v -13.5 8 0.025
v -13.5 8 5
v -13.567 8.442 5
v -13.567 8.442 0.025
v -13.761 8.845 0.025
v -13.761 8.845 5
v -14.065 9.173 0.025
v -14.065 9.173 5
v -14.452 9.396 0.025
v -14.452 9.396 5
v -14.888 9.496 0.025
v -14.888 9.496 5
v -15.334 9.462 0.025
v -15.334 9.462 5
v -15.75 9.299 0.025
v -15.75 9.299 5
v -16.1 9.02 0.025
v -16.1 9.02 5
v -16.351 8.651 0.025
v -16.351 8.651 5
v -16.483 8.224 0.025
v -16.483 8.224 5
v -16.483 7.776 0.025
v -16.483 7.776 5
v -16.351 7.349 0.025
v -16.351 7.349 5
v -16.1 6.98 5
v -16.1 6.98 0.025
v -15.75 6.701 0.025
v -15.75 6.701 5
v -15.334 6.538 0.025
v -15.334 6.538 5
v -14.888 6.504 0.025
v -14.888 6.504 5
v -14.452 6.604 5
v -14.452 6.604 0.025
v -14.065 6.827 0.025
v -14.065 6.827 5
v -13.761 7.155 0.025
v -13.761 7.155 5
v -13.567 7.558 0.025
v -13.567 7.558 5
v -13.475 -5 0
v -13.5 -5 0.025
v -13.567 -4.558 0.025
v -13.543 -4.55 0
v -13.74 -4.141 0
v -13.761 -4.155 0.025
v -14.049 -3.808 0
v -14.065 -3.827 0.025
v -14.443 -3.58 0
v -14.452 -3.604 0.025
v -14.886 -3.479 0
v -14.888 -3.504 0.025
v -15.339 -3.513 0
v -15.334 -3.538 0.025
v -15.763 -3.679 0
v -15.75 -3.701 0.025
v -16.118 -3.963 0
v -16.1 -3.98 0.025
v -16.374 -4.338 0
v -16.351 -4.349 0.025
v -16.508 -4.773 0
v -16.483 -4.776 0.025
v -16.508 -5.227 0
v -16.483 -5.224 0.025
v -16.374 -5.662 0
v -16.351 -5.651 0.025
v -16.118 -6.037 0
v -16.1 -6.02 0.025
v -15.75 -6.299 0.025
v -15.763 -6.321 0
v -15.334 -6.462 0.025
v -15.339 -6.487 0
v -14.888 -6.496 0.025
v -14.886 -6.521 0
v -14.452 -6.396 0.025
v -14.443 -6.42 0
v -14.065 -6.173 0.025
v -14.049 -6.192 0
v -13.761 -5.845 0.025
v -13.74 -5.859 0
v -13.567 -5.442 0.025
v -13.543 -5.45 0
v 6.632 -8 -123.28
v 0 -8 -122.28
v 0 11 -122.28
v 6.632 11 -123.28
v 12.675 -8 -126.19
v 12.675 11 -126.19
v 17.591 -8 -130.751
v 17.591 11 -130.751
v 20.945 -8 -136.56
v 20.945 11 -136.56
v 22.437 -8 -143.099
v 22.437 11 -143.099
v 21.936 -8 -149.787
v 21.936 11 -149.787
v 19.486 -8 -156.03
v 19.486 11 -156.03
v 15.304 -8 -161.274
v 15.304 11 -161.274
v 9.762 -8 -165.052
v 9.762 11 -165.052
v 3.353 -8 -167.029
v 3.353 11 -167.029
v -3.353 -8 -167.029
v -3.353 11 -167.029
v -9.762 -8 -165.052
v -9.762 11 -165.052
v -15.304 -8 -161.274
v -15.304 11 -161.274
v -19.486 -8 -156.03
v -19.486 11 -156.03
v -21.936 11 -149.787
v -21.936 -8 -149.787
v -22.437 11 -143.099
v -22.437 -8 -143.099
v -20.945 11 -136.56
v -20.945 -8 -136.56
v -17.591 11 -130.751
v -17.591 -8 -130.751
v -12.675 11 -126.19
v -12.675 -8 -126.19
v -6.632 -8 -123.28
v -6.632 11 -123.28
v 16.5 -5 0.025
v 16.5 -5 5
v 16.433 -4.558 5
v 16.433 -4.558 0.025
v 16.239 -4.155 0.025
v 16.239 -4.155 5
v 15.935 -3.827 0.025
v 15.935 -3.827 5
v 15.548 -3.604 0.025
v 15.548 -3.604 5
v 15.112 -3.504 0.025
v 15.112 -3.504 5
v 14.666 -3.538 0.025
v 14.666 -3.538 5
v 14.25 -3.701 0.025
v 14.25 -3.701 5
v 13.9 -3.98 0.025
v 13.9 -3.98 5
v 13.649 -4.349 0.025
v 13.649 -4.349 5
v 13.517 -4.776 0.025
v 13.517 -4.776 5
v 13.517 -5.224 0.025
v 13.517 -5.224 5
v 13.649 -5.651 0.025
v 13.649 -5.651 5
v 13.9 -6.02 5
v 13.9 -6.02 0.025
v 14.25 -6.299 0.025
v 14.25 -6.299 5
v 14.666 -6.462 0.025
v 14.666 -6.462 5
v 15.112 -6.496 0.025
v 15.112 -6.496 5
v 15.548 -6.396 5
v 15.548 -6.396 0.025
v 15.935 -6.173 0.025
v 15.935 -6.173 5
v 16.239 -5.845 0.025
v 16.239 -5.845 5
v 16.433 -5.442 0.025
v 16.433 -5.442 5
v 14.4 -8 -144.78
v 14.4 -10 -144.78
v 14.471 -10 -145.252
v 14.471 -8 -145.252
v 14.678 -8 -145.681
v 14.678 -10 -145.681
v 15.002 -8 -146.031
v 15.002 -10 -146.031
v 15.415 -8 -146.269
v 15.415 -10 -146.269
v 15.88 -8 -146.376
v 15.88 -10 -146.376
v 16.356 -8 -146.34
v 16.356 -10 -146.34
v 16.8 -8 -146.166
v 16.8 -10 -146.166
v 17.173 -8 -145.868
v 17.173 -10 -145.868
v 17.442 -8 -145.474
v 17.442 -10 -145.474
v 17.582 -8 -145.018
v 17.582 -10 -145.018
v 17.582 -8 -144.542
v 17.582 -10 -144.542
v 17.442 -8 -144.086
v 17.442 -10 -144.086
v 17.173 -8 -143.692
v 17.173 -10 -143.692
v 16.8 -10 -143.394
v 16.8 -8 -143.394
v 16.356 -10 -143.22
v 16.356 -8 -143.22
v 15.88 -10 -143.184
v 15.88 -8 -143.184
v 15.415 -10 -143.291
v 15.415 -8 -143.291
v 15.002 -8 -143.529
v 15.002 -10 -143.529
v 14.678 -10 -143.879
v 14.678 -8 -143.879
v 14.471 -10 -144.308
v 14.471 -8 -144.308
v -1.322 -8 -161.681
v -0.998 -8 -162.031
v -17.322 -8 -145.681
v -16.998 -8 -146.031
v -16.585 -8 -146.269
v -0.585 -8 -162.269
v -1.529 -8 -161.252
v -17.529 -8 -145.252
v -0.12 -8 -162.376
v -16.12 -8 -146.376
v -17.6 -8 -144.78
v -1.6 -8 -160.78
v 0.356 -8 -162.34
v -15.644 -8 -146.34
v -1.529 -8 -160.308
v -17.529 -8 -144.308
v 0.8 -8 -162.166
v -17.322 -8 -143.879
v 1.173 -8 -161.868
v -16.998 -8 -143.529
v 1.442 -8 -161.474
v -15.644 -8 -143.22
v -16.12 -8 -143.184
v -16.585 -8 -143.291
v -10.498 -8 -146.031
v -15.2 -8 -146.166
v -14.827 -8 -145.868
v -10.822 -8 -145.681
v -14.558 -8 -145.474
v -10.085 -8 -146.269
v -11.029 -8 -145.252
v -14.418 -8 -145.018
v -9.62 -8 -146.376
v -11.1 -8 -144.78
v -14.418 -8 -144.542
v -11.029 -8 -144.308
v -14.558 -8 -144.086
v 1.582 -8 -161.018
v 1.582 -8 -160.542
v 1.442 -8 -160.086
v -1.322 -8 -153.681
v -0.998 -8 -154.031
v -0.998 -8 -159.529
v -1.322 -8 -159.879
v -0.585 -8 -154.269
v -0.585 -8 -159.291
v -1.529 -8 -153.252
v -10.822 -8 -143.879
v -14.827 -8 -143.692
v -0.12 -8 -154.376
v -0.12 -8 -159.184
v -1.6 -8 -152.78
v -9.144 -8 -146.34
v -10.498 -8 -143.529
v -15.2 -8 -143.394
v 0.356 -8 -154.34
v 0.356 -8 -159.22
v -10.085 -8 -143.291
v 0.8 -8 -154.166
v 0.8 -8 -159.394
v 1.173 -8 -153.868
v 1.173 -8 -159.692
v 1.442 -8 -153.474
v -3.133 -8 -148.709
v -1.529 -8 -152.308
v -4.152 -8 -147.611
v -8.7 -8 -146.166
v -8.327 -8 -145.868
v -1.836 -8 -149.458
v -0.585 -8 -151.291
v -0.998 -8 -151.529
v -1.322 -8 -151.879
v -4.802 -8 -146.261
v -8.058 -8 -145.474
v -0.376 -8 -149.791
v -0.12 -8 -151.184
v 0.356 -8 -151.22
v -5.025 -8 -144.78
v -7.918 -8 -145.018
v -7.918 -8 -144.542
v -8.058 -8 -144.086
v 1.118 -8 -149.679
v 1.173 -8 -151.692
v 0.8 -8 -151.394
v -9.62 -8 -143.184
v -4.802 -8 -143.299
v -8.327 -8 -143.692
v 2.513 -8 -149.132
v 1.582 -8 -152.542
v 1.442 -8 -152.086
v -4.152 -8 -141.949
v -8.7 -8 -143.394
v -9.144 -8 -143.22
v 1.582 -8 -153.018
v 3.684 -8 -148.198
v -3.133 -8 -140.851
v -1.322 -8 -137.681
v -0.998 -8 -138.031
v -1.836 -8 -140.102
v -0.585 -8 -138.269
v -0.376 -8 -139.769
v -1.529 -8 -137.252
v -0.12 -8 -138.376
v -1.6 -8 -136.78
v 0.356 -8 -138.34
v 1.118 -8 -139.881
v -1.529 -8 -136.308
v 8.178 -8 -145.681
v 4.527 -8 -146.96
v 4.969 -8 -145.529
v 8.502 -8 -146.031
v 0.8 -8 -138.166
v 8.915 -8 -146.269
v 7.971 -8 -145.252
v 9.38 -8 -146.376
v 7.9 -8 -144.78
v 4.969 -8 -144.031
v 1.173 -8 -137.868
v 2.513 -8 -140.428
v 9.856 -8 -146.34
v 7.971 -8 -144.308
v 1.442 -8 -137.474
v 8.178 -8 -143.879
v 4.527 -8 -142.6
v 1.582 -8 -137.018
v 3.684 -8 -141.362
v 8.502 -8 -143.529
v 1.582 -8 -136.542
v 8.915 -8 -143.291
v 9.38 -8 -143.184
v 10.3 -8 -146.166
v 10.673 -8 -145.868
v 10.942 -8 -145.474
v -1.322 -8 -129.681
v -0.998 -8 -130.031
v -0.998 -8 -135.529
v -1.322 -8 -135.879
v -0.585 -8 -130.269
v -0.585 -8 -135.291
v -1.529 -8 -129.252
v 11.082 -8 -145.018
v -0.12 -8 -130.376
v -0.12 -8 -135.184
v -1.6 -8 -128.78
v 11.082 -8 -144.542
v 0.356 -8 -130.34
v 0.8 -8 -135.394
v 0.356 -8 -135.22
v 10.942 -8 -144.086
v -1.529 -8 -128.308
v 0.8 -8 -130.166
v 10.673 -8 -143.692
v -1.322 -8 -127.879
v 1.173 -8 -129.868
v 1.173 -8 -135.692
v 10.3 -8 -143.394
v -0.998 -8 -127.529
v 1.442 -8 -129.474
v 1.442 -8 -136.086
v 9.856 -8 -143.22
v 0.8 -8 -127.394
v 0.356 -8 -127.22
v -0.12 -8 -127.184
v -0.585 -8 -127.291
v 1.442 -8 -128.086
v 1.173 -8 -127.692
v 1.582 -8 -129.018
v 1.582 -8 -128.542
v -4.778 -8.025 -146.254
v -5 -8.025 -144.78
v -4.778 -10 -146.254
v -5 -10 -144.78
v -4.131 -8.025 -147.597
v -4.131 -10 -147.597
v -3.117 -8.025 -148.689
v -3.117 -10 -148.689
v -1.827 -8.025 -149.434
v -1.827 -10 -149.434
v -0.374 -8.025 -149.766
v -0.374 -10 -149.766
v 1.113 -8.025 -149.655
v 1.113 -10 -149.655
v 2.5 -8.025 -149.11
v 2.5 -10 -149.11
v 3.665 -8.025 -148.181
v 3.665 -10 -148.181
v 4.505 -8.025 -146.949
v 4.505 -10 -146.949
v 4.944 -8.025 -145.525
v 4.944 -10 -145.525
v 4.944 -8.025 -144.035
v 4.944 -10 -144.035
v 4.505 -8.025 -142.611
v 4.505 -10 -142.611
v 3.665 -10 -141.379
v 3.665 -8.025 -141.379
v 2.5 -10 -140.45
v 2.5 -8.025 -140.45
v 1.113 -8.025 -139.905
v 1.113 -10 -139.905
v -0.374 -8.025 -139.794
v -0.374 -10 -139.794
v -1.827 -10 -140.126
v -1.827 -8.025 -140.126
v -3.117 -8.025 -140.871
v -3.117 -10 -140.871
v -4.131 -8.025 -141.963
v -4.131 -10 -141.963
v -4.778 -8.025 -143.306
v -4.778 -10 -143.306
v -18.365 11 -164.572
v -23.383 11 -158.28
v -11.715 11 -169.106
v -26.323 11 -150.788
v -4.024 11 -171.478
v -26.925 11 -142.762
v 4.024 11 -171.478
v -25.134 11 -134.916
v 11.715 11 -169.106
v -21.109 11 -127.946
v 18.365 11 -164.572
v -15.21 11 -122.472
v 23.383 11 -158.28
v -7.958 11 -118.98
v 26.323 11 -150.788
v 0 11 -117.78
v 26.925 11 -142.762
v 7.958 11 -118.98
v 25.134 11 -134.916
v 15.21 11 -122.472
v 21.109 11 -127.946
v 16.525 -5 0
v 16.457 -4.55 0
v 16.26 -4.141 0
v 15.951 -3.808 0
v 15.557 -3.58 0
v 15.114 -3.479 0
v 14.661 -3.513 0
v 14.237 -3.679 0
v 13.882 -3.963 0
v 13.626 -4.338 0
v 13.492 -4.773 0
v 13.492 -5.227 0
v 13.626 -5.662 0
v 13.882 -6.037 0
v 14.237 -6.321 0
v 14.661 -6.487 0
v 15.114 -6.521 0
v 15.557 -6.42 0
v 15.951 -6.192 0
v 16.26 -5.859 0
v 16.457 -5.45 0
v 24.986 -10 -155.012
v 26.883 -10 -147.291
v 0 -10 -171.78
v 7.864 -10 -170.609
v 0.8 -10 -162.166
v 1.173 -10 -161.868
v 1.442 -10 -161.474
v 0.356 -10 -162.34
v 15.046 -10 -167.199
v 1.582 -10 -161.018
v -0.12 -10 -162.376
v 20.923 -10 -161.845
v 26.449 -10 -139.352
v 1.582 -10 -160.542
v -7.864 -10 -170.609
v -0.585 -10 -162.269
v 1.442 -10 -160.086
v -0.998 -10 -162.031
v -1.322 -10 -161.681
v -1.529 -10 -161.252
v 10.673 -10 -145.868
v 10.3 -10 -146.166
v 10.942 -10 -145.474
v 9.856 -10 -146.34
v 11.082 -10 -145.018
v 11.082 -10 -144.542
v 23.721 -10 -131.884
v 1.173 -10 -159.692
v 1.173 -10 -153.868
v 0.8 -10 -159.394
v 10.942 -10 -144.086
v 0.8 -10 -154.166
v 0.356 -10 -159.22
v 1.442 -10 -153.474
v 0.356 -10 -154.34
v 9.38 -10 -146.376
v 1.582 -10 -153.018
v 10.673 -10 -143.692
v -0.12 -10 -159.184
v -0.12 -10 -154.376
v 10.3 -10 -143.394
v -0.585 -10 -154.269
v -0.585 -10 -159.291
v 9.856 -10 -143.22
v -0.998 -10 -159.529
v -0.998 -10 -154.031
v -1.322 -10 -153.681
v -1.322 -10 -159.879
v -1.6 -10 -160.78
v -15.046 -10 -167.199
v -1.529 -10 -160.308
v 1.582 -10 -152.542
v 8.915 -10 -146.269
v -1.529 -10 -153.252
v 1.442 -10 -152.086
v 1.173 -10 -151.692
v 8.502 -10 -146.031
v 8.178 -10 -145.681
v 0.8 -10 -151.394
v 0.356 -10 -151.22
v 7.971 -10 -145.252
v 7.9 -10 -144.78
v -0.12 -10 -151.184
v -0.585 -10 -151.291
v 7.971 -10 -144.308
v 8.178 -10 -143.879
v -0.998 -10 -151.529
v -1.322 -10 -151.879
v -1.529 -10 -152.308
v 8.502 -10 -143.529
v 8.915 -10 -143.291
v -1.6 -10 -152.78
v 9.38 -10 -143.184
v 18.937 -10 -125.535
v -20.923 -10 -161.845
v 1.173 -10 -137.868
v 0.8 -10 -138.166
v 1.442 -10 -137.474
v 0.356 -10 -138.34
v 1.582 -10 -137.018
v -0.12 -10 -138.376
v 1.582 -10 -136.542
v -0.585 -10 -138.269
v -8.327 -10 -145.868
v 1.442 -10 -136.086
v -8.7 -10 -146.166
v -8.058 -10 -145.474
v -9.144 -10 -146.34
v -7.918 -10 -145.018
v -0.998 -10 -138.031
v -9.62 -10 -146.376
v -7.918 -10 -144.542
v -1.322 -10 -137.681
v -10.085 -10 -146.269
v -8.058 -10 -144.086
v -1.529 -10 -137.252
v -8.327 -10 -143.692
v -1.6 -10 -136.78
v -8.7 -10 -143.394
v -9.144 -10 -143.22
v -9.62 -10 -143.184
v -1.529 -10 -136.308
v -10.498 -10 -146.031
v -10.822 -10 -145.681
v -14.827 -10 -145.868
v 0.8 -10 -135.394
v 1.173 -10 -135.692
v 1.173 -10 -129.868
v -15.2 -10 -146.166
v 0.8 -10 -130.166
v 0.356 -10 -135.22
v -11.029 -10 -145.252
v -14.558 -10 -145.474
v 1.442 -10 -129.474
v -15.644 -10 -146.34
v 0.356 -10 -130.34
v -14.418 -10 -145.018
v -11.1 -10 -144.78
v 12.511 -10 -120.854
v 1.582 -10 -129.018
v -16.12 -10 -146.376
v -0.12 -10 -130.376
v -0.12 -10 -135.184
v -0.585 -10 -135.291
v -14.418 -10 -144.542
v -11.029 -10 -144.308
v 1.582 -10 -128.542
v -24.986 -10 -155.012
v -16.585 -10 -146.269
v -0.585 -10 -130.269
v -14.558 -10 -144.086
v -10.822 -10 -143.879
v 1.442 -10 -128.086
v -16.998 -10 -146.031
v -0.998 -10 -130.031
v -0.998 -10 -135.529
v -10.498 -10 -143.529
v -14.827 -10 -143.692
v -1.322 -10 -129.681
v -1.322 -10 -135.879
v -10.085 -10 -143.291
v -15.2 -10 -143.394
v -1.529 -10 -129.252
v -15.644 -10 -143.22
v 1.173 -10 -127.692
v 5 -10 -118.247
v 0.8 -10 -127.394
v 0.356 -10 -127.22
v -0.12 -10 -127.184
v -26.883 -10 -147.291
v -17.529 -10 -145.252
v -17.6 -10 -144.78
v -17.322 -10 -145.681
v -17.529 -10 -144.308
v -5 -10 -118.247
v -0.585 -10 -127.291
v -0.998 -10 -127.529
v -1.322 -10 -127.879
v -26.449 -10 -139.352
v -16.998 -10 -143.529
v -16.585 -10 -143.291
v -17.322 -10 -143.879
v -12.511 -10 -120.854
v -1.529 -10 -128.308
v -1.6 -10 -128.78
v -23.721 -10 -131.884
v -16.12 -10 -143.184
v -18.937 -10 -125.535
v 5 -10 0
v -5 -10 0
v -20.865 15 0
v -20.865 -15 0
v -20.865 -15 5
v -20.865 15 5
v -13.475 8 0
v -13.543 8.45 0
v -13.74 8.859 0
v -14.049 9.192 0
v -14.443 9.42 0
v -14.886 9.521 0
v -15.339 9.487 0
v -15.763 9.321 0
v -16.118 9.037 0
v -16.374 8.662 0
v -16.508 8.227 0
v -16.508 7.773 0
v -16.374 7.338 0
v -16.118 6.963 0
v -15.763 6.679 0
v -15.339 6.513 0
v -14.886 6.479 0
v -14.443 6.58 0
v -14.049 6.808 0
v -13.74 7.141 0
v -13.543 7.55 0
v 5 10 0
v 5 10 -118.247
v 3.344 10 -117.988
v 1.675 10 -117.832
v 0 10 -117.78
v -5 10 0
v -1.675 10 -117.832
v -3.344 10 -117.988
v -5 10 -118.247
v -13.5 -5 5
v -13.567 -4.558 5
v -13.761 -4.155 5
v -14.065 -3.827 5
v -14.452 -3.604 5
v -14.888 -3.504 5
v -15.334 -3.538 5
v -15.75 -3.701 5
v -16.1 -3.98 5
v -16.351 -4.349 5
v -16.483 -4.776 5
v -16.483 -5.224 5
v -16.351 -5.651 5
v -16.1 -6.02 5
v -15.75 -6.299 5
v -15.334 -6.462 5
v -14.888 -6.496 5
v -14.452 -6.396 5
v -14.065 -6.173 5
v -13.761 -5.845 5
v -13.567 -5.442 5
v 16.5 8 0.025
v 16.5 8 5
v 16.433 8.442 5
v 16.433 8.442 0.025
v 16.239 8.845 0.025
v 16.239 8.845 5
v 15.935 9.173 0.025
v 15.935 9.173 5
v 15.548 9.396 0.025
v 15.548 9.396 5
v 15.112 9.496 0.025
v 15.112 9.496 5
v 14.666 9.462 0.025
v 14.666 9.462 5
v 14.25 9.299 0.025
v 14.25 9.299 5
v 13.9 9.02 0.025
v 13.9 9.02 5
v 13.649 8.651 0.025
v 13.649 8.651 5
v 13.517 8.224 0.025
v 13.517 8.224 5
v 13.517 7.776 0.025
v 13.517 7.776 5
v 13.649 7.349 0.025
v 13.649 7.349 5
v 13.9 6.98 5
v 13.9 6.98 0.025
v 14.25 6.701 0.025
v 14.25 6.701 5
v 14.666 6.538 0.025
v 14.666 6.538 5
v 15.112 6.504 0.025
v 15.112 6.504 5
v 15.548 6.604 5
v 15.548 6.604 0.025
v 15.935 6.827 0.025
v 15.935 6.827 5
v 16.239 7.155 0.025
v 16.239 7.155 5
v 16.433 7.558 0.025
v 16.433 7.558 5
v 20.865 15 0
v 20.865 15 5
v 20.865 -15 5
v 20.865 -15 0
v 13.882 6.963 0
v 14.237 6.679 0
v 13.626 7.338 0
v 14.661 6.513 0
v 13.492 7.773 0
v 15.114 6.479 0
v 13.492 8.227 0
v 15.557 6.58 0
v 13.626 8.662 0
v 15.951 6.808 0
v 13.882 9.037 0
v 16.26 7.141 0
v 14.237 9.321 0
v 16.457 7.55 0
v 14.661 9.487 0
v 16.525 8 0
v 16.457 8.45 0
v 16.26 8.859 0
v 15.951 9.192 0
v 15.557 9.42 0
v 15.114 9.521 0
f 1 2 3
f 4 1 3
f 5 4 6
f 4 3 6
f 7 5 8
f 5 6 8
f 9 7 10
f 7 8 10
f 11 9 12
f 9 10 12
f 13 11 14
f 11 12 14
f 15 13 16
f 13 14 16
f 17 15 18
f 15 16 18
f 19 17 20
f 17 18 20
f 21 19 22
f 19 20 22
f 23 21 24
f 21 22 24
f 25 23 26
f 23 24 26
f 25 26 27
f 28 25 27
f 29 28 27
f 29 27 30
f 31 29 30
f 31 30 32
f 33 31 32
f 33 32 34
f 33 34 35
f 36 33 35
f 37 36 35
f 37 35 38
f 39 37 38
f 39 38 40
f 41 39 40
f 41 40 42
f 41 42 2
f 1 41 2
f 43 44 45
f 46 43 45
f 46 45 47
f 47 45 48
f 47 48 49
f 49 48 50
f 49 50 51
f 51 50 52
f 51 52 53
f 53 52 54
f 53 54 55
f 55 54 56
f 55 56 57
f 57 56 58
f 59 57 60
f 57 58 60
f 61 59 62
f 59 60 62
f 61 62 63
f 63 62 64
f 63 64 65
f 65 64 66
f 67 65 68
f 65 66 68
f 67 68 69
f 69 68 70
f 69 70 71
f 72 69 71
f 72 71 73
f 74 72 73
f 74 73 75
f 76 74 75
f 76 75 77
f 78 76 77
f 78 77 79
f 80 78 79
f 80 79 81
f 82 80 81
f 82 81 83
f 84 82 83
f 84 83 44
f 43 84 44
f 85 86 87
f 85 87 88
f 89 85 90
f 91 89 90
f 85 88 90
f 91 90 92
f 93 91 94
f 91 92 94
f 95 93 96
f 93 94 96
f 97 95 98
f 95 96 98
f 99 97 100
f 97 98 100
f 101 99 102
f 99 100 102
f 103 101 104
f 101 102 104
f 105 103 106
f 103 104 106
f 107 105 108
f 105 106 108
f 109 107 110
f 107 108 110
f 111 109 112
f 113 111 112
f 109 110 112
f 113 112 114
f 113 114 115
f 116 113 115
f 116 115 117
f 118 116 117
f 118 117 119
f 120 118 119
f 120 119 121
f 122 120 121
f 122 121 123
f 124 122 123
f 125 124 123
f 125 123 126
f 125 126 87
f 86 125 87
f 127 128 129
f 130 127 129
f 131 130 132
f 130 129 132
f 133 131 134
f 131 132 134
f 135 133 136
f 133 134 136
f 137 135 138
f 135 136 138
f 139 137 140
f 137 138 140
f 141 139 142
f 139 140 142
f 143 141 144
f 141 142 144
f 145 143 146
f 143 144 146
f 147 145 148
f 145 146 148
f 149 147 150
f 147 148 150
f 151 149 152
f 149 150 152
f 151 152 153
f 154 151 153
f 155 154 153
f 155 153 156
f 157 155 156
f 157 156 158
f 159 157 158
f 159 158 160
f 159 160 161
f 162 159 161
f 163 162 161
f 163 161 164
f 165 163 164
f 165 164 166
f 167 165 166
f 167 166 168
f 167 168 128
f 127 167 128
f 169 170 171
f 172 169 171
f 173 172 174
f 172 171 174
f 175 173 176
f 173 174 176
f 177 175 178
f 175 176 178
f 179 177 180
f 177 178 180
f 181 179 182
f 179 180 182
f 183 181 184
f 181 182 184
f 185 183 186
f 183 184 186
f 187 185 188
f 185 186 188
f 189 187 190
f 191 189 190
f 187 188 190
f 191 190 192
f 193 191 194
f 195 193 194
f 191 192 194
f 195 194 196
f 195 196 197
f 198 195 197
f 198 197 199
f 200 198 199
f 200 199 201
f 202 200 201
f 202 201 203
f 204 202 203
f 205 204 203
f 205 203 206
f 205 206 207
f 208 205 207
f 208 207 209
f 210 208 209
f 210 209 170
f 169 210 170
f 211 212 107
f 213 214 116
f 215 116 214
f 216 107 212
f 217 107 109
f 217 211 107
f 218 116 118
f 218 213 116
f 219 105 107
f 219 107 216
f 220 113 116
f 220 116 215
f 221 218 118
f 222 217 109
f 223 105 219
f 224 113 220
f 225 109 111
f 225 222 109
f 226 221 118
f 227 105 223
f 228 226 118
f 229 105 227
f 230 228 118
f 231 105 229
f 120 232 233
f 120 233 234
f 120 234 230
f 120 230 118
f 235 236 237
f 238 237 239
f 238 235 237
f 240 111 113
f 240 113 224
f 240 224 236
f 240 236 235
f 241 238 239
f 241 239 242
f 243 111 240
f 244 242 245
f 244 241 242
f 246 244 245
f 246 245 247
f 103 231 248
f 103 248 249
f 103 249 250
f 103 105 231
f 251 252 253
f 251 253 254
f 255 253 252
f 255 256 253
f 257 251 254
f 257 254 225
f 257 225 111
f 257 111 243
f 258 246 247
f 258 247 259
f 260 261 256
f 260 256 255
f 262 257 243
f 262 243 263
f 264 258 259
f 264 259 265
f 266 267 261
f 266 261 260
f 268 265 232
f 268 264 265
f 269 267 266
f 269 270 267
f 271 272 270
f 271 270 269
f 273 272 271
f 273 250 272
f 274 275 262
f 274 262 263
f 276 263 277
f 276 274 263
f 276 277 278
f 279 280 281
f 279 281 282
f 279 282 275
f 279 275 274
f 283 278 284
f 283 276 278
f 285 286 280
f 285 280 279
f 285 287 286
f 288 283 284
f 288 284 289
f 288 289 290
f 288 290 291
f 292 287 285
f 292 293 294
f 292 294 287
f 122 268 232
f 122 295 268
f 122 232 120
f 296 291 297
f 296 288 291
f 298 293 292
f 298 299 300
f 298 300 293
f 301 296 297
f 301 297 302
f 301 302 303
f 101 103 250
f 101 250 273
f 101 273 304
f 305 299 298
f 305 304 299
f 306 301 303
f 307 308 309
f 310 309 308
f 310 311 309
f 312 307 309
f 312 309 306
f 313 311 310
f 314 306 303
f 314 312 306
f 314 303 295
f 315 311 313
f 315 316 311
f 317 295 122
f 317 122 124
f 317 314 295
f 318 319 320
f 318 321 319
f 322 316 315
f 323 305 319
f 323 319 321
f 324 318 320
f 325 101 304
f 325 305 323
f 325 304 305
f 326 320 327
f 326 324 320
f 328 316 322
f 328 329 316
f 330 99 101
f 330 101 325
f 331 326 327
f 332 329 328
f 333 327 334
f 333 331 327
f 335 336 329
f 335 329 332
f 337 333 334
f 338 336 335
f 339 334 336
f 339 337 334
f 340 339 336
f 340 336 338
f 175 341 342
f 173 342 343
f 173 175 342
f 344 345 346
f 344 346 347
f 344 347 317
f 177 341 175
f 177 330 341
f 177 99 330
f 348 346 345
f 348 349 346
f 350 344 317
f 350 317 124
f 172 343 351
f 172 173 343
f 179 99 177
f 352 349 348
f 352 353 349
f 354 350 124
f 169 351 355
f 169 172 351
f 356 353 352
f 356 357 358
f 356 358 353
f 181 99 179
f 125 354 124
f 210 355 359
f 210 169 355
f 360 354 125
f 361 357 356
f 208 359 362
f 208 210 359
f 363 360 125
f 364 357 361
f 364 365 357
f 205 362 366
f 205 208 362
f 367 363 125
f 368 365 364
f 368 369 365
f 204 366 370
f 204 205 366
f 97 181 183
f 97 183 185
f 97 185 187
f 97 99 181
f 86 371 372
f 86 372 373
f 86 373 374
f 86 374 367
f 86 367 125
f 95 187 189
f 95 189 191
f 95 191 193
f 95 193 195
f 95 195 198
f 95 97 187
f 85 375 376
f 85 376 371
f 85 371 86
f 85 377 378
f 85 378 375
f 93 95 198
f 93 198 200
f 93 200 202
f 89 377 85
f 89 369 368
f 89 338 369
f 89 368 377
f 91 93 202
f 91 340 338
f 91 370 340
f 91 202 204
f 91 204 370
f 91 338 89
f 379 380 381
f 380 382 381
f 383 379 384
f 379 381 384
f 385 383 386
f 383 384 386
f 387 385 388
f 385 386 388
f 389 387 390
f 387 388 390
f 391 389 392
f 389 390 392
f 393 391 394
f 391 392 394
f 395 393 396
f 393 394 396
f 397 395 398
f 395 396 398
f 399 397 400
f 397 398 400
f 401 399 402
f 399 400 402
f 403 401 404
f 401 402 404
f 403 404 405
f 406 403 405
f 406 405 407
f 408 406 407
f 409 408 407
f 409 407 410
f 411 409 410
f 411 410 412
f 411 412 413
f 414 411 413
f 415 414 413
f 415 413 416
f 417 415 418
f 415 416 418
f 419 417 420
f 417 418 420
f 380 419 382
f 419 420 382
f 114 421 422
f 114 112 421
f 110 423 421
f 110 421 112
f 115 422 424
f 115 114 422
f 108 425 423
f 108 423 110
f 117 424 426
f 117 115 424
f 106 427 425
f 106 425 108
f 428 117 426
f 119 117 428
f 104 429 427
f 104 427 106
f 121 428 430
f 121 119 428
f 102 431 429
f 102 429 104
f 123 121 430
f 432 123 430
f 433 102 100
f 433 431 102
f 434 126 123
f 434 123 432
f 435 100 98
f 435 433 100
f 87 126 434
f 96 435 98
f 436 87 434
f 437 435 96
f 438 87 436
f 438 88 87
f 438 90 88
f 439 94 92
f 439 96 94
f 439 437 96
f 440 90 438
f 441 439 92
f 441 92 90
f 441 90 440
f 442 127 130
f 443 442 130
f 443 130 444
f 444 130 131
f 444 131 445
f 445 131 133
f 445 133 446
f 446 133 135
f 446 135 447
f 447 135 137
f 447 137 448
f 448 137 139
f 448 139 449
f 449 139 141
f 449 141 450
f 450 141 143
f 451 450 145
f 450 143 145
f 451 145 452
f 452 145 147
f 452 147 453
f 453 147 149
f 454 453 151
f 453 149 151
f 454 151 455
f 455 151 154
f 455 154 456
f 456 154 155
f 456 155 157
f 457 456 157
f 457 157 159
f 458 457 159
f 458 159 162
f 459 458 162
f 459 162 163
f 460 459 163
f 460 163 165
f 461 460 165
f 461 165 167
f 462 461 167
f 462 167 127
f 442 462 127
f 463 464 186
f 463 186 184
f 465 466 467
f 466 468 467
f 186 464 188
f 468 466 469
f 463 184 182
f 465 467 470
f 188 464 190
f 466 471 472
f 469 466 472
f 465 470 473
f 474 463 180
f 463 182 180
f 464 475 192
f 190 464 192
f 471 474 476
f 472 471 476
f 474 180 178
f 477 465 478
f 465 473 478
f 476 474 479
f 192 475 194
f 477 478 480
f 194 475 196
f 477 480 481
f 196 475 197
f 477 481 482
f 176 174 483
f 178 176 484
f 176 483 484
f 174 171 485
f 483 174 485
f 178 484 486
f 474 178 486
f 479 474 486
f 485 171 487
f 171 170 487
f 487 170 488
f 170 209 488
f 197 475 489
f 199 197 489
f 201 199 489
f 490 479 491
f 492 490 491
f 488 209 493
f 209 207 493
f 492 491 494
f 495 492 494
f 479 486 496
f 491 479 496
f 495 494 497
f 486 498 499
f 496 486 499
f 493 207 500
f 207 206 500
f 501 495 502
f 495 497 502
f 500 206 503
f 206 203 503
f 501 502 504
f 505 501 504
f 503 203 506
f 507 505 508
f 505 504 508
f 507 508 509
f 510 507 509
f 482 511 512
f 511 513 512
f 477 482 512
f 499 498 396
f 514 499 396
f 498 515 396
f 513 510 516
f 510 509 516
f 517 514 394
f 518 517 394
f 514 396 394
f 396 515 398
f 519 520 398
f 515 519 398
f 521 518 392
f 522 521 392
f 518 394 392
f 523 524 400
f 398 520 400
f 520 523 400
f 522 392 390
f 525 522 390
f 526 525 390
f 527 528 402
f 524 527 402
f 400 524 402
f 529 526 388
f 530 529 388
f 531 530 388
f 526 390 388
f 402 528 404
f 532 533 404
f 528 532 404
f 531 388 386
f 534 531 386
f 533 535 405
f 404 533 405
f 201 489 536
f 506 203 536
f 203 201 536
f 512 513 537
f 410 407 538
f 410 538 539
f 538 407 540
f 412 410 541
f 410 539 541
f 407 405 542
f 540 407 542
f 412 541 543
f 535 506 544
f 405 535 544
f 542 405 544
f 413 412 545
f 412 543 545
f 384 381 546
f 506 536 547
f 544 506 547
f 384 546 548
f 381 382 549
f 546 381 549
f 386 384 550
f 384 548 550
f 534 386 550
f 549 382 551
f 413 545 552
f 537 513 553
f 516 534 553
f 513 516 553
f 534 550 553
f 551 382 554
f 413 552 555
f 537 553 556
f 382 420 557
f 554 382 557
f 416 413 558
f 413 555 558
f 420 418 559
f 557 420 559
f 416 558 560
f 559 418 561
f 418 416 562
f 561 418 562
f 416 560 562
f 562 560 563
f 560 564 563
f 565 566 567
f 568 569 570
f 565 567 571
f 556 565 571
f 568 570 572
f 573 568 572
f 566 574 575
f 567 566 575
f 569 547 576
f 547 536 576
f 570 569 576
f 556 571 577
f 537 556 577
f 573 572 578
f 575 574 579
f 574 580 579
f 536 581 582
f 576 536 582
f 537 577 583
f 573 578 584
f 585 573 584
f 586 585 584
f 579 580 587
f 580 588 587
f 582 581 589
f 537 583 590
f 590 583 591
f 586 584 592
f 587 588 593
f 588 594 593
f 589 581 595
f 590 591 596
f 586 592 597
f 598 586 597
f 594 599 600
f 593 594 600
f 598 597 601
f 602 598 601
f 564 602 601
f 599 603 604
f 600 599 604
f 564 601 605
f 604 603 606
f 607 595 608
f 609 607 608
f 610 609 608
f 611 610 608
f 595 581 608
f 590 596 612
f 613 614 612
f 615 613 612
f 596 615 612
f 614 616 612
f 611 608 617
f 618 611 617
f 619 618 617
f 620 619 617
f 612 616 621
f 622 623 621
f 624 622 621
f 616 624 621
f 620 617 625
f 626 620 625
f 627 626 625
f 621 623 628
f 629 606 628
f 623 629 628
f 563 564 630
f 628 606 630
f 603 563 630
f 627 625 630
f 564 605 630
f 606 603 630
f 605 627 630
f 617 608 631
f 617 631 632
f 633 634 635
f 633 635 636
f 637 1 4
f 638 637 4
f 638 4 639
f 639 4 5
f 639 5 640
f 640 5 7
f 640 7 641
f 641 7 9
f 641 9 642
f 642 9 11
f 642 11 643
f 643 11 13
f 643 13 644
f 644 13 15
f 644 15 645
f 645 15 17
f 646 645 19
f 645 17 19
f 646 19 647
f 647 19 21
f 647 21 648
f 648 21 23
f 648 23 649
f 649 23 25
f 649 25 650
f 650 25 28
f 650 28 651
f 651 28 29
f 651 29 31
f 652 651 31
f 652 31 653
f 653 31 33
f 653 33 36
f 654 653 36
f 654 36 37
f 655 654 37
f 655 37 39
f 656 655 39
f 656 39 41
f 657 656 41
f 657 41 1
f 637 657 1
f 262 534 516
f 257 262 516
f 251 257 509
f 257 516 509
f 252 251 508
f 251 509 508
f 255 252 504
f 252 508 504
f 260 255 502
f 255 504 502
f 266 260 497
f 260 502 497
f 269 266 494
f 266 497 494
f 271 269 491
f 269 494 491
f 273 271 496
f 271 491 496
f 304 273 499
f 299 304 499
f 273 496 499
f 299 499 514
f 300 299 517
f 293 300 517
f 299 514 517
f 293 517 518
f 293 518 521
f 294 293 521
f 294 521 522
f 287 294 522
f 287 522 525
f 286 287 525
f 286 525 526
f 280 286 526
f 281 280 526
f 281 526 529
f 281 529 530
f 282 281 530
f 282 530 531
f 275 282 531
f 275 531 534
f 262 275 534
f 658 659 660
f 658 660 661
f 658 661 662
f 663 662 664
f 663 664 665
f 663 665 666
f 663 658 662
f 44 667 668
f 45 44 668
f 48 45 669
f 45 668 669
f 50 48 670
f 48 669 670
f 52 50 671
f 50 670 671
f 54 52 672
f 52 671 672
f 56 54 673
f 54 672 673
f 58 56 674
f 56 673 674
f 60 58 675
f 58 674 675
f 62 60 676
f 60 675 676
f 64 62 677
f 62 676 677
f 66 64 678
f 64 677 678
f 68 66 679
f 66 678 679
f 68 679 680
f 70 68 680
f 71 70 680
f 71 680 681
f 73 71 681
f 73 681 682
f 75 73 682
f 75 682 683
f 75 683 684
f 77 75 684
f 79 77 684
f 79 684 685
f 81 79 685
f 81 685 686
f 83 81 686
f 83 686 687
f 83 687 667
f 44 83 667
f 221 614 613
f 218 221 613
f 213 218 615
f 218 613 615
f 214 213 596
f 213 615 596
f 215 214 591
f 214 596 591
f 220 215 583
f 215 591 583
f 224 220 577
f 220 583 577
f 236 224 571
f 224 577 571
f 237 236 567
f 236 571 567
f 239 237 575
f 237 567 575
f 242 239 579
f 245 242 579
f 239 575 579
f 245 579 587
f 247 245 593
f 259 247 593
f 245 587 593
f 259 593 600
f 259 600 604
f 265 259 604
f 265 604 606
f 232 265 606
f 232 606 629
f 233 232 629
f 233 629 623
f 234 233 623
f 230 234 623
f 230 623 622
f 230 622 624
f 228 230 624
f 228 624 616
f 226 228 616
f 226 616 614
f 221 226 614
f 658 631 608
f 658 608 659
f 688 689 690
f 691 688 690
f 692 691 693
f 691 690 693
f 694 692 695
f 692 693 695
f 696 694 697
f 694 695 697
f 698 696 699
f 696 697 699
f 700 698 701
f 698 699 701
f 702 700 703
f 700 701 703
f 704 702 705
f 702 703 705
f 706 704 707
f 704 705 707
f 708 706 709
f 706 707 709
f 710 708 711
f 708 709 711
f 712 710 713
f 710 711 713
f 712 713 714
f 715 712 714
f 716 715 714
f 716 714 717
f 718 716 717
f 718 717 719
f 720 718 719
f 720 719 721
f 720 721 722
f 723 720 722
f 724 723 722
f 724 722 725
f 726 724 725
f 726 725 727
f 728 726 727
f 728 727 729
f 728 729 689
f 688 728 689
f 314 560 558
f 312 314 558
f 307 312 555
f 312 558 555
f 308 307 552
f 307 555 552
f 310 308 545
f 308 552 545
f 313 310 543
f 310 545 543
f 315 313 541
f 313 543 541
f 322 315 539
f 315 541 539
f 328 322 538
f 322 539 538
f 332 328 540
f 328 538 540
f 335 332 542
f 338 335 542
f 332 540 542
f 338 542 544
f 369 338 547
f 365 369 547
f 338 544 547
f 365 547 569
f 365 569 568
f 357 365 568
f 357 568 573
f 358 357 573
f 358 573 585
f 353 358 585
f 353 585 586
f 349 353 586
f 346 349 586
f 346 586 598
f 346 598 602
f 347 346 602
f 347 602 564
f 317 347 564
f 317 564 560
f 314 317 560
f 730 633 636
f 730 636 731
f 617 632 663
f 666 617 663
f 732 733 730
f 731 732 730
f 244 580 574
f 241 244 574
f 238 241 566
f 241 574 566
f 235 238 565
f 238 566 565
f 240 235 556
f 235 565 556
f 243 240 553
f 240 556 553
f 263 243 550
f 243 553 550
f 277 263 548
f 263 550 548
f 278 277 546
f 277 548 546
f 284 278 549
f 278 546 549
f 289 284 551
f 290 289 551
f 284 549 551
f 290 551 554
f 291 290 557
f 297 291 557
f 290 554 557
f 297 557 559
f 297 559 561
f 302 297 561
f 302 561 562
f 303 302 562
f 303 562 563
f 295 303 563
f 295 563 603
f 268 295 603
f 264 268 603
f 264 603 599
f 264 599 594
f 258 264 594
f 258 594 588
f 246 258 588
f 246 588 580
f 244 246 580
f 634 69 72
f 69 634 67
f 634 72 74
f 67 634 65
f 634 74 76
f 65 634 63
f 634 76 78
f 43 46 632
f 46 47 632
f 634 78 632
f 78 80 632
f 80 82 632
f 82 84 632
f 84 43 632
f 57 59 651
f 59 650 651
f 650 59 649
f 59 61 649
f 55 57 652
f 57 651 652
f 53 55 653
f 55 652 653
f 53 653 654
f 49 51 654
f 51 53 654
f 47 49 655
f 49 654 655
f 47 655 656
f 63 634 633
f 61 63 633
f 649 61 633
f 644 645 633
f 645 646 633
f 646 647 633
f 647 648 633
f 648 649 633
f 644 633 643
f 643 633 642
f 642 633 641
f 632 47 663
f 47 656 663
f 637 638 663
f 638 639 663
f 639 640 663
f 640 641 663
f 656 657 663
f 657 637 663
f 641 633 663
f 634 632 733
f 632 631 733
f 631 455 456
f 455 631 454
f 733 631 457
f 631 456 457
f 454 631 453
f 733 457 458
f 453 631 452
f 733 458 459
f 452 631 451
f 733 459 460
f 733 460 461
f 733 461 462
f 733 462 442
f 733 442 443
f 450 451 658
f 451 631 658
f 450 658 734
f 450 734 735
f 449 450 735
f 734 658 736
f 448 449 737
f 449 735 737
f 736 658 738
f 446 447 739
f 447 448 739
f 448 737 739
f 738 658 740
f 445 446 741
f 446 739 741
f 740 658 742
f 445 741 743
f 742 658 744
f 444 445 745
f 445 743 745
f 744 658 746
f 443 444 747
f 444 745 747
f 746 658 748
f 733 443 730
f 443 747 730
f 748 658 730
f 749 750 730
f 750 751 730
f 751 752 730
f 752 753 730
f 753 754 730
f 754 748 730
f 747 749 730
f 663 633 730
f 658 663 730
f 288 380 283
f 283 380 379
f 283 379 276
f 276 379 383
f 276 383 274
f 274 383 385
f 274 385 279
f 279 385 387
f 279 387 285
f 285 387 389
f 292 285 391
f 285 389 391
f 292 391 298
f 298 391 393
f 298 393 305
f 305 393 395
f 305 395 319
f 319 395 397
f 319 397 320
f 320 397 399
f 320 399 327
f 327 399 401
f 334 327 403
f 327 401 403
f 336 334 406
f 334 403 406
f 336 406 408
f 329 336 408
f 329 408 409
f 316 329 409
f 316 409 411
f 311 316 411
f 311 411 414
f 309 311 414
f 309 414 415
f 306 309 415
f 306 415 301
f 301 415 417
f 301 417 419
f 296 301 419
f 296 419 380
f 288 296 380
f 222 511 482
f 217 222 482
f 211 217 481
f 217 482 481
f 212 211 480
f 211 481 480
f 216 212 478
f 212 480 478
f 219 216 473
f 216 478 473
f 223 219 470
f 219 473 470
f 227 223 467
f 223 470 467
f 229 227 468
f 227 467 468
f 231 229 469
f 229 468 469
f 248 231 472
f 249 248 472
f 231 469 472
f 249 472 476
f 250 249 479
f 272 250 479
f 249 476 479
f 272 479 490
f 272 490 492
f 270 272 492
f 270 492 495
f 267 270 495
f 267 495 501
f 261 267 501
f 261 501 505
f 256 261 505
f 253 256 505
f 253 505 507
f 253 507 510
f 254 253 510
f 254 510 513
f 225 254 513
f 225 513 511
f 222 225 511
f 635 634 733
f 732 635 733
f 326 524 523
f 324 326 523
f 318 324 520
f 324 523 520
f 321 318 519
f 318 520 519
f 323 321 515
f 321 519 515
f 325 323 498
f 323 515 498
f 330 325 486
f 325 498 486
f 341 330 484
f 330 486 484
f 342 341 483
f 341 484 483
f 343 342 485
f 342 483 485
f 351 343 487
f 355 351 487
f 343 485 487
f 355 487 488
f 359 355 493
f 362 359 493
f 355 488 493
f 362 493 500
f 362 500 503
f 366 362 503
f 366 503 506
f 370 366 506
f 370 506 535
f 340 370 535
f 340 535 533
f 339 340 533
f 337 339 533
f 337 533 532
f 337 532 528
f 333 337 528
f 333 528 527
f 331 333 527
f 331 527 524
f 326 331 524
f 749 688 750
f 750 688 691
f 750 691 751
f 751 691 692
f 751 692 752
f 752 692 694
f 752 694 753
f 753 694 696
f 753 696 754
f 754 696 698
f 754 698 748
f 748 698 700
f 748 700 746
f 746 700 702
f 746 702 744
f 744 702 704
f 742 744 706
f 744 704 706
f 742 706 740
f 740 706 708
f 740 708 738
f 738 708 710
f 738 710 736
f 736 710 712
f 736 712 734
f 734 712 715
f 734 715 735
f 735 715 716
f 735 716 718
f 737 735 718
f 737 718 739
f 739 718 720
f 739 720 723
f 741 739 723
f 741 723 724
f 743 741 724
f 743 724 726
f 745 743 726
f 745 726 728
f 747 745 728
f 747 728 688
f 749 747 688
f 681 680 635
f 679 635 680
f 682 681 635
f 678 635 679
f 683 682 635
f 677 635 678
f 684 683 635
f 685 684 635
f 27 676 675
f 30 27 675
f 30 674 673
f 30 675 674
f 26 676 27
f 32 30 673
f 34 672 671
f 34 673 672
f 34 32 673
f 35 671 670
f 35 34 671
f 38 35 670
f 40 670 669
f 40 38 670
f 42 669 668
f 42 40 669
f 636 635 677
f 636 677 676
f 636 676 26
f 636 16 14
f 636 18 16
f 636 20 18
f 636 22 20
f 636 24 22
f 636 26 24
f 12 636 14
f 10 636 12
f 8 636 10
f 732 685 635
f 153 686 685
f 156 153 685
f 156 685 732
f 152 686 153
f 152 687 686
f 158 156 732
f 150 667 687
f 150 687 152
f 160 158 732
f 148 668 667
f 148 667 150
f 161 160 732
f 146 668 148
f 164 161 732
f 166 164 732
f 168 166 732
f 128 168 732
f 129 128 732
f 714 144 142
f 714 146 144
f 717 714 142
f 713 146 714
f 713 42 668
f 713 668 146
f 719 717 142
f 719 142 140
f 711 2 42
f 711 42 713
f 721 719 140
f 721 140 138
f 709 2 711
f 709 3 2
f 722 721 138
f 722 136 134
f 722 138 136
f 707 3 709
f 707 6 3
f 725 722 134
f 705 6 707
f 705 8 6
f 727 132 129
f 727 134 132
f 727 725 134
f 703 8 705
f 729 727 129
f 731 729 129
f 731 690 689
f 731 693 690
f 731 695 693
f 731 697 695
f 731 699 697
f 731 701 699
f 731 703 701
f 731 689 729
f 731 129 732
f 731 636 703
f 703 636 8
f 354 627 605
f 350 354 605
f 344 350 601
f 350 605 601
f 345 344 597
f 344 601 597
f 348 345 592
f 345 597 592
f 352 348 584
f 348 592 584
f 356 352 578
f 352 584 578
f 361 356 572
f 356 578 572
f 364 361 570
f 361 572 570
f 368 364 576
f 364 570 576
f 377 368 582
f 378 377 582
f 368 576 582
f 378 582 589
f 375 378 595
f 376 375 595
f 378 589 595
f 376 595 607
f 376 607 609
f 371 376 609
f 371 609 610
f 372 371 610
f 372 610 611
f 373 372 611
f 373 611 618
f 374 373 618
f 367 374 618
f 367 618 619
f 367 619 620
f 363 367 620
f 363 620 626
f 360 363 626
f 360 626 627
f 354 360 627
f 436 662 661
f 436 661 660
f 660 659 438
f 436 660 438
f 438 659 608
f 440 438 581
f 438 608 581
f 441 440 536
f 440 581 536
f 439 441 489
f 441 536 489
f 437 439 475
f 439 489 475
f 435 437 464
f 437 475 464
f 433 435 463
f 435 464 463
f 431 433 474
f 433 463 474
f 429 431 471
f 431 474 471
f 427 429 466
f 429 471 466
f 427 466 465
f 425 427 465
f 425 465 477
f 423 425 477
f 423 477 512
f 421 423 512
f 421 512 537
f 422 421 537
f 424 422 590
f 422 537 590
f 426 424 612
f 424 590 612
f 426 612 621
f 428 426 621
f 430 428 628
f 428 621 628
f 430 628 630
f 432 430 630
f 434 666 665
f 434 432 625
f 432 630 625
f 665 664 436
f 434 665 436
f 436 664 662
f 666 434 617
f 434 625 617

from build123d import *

# Parameters (mm, degrees)
SKETCH1_W                        = 41.73
SKETCH1_H                        = 30
BOSS_EXTRUDE1_DEPTH              = 5
SKETCH2_W                        = 10
SKETCH2_H                        = 20
BOSS_EXTRUDE3_DEPTH              = 144.78
BOSS_EXTRUDE5_DEPTH              = 1
BOSS_EXTRUDE5_DEPTH_BACK         = 8
SKETCH3_R                        = 27
SKETCH3_R_2                      = 22.5
SKETCH4_R                        = 22.5
CUT_EXTRUDE3_DEPTH               = 176.676886357
SKETCH7_R                        = 27
BOSS_EXTRUDE6_DEPTH              = 20
CUT_EXTRUDE5_START               = -18
SKETCH4_2_R                      = 22.5
CUT_EXTRUDE5_DEPTH               = 18
F_3_0MM_DOWEL_HOLE3_D            = 3
F_3_0MM_DOWEL_HOLE3_DEPTH        = 5
F_3_0MM_DOWEL_HOLE3_CSINK_D      = 3.05
F_3_0MM_DOWEL_HOLE3_CSINK_ANGLE  = 90
F_10_0MM_DOWEL_HOLE1_D           = 10
F_10_0MM_DOWEL_HOLE1_CSINK_D     = 10.05
F_10_0MM_DOWEL_HOLE1_CSINK_ANGLE = 90
F_3_0MM_DOWEL_HOLE4_D            = 3.2


with BuildPart() as part:
    # Sketch1 → Boss-Extrude1 (new body)
    with BuildSketch(Plane.XY):
        Rectangle(SKETCH1_W, SKETCH1_H)
    extrude(amount=BOSS_EXTRUDE1_DEPTH)

    # Sketch2 → Boss-Extrude3 (add)
    with BuildSketch(Plane(origin=(0, 0, 0), x_dir=(-1, 0, 0), z_dir=(0, 0, -1))):
        Rectangle(SKETCH2_W, SKETCH2_H)
    extrude(amount=BOSS_EXTRUDE3_DEPTH)

    # Sketch3 → Boss-Extrude5 (add, two sides: drawn at the far end of the back side and taken through both)
    with BuildSketch(Plane(origin=(0, 10, 0), x_dir=(1, 0, 0), z_dir=(0, 1, 0)).offset(-BOSS_EXTRUDE5_DEPTH_BACK)):
        with Locations(Location((0, 144.78, 0), (0, 0, 270))):
            Circle(SKETCH3_R)
        with Locations(Location((0, 144.78, 0), (0, 0, 270))):
            Circle(SKETCH3_R_2, mode=Mode.SUBTRACT)
    extrude(amount=BOSS_EXTRUDE5_DEPTH + BOSS_EXTRUDE5_DEPTH_BACK)

    # Sketch4 → Cut-Extrude3 (cut, through all)
    with BuildSketch(Plane(origin=(0, 10, 0), x_dir=(1, 0, 0), z_dir=(0, 1, 0))):
        with Locations(Location((0, 144.78, 0), (0, 0, 270))):
            Circle(SKETCH4_R)
    extrude(amount=-CUT_EXTRUDE3_DEPTH, mode=Mode.SUBTRACT)

    # Sketch7 → Boss-Extrude6 (add)
    with BuildSketch(Plane(origin=(0, 10, 0), x_dir=(1, 0, 0), z_dir=(0, 1, 0))):
        with Locations(Location((0, 144.78, 0), (0, 0, 270))):
            Circle(SKETCH7_R)
    extrude(amount=-BOSS_EXTRUDE6_DEPTH)

    # Sketch4<2> → Cut-Extrude5 (cut)
    with BuildSketch(Plane(origin=(0, 10, 0), x_dir=(1, 0, 0), z_dir=(0, 1, 0)).offset(CUT_EXTRUDE5_START)):
        with Locations(Location((0, 144.78, 0), (0, 0, 270))):
            Circle(SKETCH4_2_R)
    extrude(amount=CUT_EXTRUDE5_DEPTH, mode=Mode.SUBTRACT)

    # Ø3.0mm Dowel Hole3
    with Locations(Plane(origin=(0, 0, 0), x_dir=(-1, 0, 0), z_dir=(0, 0, -1))):
        with Locations((15, 8), (-15, 8), (15, -5), (-15, -5)):
            CounterSinkHole(F_3_0MM_DOWEL_HOLE3_D / 2, F_3_0MM_DOWEL_HOLE3_CSINK_D / 2, depth=F_3_0MM_DOWEL_HOLE3_DEPTH, counter_sink_angle=F_3_0MM_DOWEL_HOLE3_CSINK_ANGLE)

    # Ø10.0mm Dowel Hole1 (through all)
    with Locations(Plane(origin=(0, -8, 0), x_dir=(1, 0, 0), z_dir=(0, 1, 0))):
        with Locations((0, 144.78)):
            CounterSinkHole(F_10_0MM_DOWEL_HOLE1_D / 2, F_10_0MM_DOWEL_HOLE1_CSINK_D / 2, counter_sink_angle=F_10_0MM_DOWEL_HOLE1_CSINK_ANGLE)

    # Ø3.0mm Dowel Hole4 (through all)
    with Locations(Plane(origin=(0, -8, 0), x_dir=(1, 0, 0), z_dir=(0, 1, 0))):
        with Locations((0, 128.78), (0, 136.78), (16, 144.78), (9.5, 144.78), (0, 160.78), (0, 152.78), (-16, 144.78), (-9.5, 144.78)):
            Hole(F_3_0MM_DOWEL_HOLE4_D / 2)


solid = part.part
